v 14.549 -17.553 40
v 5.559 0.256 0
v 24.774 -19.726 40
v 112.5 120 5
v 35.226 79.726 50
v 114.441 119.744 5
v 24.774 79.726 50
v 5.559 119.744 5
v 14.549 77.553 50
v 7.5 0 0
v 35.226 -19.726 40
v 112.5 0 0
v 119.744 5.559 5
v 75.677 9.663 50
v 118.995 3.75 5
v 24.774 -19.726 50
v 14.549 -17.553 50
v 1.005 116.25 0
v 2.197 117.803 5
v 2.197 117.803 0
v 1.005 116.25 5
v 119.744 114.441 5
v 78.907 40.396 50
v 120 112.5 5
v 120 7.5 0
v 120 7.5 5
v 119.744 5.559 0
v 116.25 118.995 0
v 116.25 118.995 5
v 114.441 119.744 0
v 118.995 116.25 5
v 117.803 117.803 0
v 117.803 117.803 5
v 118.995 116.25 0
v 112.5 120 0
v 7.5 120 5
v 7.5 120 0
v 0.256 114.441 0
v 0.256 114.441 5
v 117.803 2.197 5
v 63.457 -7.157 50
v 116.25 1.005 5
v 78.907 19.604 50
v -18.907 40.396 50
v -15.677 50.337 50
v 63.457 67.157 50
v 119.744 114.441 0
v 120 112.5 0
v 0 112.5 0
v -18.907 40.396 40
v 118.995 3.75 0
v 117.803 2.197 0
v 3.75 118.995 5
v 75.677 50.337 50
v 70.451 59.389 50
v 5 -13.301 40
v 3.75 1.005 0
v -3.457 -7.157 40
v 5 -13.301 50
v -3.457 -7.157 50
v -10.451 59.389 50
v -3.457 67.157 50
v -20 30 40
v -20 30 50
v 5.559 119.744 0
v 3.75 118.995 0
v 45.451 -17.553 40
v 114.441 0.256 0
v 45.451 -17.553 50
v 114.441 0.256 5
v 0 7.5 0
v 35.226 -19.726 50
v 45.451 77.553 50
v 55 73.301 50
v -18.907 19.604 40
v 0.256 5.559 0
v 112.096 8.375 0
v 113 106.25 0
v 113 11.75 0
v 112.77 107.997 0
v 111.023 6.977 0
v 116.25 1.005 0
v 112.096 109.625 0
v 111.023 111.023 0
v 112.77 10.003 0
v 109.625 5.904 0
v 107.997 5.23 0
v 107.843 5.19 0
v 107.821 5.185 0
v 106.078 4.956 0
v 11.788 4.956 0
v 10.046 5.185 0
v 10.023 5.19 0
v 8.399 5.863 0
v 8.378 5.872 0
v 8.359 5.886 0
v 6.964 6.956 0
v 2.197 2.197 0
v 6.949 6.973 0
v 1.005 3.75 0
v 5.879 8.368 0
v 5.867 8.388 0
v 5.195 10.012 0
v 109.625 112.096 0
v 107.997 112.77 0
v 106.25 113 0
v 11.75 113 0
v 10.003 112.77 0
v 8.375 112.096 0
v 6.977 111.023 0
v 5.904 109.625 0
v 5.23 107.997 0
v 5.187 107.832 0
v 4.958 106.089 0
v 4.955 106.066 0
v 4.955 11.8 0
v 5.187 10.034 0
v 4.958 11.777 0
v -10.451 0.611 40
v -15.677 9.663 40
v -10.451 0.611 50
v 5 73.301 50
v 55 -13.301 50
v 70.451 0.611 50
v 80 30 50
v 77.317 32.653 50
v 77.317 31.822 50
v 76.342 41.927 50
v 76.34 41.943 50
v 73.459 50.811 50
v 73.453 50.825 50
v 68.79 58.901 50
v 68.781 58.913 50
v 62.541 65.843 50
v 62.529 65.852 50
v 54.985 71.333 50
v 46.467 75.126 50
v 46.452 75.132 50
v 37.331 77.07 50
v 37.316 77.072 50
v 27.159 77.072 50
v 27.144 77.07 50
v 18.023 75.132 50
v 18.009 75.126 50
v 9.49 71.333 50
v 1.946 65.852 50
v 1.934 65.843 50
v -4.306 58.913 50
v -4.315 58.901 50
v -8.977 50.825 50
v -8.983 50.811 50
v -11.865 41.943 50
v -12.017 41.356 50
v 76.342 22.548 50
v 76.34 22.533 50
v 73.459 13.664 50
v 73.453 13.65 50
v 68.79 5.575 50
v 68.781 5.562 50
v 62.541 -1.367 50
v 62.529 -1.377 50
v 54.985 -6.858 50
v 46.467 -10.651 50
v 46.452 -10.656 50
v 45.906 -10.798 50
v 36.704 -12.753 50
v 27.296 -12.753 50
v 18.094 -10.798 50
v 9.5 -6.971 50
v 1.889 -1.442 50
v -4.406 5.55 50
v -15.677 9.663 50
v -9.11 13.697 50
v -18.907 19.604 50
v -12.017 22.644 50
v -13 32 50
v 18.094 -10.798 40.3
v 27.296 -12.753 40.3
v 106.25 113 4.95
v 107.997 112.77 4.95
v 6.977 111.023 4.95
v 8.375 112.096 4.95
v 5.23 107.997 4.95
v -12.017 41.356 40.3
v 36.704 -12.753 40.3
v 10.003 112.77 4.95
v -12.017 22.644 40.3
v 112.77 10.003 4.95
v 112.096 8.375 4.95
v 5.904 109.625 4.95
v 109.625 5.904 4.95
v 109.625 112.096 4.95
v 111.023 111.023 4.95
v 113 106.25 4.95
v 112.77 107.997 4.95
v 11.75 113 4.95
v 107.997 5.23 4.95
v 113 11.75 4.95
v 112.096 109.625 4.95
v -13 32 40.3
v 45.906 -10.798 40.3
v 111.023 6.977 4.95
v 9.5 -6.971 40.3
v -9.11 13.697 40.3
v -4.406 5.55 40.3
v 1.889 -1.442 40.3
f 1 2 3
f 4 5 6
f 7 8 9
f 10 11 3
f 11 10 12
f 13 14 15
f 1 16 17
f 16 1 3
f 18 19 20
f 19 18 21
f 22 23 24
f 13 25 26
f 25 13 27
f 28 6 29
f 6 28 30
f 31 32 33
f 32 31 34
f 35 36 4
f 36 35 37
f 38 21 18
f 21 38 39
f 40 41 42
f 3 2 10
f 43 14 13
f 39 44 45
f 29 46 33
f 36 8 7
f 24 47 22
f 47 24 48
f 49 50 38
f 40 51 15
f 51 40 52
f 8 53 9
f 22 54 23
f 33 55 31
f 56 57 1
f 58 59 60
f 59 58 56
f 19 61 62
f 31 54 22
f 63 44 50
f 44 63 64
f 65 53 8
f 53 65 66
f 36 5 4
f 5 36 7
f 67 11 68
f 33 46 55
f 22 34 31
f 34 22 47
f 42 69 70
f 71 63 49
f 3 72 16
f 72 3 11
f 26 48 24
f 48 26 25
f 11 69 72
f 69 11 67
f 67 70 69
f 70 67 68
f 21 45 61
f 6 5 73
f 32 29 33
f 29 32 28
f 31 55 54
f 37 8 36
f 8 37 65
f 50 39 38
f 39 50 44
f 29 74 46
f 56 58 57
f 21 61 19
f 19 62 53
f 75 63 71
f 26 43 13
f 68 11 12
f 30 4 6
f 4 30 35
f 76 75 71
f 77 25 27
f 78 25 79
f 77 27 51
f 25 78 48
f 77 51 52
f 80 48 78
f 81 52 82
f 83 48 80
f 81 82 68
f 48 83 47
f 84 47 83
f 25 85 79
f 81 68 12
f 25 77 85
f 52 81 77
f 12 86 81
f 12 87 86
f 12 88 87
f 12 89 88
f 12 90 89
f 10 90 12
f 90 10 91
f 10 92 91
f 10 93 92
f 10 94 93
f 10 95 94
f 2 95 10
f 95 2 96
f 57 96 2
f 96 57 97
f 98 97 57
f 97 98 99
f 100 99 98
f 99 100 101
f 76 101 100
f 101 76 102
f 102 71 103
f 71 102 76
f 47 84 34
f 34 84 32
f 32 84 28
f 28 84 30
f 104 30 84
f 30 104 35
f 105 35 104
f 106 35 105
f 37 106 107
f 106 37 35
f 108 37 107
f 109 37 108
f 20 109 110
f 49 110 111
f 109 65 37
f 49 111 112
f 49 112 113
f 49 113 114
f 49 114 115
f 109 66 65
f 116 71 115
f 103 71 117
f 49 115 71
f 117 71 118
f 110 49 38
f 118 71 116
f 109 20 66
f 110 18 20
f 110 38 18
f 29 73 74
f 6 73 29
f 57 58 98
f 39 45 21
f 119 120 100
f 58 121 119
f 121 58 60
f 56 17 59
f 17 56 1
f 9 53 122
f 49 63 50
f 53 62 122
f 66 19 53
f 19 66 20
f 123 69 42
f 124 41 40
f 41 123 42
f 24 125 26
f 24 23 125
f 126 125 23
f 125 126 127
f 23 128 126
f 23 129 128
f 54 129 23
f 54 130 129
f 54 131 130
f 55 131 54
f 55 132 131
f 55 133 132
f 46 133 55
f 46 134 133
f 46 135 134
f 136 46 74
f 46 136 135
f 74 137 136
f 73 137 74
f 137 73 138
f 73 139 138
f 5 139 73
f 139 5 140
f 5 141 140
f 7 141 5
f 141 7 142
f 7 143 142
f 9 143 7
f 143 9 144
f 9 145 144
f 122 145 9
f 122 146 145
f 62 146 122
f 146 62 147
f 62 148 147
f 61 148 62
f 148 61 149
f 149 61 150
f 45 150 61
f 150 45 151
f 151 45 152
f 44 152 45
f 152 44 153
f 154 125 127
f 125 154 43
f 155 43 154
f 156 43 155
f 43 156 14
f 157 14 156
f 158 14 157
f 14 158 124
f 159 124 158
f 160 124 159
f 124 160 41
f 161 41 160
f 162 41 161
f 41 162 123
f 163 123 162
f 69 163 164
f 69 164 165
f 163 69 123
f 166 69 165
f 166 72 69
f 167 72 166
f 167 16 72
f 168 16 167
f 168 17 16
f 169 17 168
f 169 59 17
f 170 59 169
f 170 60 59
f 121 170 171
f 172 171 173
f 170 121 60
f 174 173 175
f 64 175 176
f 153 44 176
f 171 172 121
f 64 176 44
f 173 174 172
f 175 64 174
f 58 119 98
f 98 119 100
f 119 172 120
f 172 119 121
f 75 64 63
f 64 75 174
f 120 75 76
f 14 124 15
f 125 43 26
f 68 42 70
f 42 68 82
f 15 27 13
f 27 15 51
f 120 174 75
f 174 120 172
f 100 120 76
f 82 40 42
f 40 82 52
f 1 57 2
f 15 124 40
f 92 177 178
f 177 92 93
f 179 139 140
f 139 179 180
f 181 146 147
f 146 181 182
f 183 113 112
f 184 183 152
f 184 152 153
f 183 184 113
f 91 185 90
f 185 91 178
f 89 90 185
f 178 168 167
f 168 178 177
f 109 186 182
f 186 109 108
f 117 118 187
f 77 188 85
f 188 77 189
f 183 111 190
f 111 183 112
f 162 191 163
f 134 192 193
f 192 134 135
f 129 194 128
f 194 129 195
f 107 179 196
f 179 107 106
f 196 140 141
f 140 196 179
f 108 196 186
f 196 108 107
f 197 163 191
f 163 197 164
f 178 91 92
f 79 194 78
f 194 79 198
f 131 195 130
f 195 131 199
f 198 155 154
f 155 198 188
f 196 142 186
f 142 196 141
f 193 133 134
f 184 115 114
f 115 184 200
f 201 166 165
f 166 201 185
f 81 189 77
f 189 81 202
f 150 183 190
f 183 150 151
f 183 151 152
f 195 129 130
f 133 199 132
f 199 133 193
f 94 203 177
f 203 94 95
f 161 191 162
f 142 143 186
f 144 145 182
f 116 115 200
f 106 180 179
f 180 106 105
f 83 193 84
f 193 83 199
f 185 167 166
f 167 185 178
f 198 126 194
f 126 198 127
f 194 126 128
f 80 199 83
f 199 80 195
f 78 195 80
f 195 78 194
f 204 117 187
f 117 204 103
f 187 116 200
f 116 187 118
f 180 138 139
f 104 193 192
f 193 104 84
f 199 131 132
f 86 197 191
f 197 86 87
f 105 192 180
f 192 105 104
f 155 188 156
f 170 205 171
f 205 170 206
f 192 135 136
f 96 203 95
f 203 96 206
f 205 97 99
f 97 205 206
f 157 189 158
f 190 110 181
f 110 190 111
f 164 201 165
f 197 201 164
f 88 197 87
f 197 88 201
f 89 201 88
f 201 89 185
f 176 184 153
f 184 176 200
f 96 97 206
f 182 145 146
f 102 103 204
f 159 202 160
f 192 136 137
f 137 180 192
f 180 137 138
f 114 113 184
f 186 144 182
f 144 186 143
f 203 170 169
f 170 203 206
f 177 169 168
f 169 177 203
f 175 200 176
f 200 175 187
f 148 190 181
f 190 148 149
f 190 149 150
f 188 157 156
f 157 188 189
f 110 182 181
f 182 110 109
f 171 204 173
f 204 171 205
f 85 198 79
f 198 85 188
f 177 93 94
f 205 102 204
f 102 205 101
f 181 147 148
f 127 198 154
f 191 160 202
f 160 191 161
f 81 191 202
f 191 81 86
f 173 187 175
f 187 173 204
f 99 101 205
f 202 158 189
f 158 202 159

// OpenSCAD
difference() {
    shroud();
    translate([5, 5, -0.1]) {
        scale([0.9, 0.9, 1.01]) {
            shroud();
        }
    }
}

module shroud() {
    hull() {
        translate([30, 30, 40]) {
            cylinder(r=50, h=10);
        }

        mounting_plate();
    }
}

module mounting_plate() {
    difference() {
        //cube([120, 120, 5]);
        hull() {
            posts(7.5, 5);
        }
        translate([0, 0, -1]) {
            posts(3, 100);
        }
    }
}

module posts(r, h) {
    translate([7.5, 7.5, 0]) {
        cylinder(r=r, h=h);
    }
    translate([120-7.5, 7.5, 0]) {
        cylinder(r=r, h=h);
    }
    translate([120-7.5, 120-7.5, 0]) {
        cylinder(r=r, h=h);
    }
    translate([7.5, 120-7.5, 0]) {
        cylinder(r=r, h=h);
    }
}
